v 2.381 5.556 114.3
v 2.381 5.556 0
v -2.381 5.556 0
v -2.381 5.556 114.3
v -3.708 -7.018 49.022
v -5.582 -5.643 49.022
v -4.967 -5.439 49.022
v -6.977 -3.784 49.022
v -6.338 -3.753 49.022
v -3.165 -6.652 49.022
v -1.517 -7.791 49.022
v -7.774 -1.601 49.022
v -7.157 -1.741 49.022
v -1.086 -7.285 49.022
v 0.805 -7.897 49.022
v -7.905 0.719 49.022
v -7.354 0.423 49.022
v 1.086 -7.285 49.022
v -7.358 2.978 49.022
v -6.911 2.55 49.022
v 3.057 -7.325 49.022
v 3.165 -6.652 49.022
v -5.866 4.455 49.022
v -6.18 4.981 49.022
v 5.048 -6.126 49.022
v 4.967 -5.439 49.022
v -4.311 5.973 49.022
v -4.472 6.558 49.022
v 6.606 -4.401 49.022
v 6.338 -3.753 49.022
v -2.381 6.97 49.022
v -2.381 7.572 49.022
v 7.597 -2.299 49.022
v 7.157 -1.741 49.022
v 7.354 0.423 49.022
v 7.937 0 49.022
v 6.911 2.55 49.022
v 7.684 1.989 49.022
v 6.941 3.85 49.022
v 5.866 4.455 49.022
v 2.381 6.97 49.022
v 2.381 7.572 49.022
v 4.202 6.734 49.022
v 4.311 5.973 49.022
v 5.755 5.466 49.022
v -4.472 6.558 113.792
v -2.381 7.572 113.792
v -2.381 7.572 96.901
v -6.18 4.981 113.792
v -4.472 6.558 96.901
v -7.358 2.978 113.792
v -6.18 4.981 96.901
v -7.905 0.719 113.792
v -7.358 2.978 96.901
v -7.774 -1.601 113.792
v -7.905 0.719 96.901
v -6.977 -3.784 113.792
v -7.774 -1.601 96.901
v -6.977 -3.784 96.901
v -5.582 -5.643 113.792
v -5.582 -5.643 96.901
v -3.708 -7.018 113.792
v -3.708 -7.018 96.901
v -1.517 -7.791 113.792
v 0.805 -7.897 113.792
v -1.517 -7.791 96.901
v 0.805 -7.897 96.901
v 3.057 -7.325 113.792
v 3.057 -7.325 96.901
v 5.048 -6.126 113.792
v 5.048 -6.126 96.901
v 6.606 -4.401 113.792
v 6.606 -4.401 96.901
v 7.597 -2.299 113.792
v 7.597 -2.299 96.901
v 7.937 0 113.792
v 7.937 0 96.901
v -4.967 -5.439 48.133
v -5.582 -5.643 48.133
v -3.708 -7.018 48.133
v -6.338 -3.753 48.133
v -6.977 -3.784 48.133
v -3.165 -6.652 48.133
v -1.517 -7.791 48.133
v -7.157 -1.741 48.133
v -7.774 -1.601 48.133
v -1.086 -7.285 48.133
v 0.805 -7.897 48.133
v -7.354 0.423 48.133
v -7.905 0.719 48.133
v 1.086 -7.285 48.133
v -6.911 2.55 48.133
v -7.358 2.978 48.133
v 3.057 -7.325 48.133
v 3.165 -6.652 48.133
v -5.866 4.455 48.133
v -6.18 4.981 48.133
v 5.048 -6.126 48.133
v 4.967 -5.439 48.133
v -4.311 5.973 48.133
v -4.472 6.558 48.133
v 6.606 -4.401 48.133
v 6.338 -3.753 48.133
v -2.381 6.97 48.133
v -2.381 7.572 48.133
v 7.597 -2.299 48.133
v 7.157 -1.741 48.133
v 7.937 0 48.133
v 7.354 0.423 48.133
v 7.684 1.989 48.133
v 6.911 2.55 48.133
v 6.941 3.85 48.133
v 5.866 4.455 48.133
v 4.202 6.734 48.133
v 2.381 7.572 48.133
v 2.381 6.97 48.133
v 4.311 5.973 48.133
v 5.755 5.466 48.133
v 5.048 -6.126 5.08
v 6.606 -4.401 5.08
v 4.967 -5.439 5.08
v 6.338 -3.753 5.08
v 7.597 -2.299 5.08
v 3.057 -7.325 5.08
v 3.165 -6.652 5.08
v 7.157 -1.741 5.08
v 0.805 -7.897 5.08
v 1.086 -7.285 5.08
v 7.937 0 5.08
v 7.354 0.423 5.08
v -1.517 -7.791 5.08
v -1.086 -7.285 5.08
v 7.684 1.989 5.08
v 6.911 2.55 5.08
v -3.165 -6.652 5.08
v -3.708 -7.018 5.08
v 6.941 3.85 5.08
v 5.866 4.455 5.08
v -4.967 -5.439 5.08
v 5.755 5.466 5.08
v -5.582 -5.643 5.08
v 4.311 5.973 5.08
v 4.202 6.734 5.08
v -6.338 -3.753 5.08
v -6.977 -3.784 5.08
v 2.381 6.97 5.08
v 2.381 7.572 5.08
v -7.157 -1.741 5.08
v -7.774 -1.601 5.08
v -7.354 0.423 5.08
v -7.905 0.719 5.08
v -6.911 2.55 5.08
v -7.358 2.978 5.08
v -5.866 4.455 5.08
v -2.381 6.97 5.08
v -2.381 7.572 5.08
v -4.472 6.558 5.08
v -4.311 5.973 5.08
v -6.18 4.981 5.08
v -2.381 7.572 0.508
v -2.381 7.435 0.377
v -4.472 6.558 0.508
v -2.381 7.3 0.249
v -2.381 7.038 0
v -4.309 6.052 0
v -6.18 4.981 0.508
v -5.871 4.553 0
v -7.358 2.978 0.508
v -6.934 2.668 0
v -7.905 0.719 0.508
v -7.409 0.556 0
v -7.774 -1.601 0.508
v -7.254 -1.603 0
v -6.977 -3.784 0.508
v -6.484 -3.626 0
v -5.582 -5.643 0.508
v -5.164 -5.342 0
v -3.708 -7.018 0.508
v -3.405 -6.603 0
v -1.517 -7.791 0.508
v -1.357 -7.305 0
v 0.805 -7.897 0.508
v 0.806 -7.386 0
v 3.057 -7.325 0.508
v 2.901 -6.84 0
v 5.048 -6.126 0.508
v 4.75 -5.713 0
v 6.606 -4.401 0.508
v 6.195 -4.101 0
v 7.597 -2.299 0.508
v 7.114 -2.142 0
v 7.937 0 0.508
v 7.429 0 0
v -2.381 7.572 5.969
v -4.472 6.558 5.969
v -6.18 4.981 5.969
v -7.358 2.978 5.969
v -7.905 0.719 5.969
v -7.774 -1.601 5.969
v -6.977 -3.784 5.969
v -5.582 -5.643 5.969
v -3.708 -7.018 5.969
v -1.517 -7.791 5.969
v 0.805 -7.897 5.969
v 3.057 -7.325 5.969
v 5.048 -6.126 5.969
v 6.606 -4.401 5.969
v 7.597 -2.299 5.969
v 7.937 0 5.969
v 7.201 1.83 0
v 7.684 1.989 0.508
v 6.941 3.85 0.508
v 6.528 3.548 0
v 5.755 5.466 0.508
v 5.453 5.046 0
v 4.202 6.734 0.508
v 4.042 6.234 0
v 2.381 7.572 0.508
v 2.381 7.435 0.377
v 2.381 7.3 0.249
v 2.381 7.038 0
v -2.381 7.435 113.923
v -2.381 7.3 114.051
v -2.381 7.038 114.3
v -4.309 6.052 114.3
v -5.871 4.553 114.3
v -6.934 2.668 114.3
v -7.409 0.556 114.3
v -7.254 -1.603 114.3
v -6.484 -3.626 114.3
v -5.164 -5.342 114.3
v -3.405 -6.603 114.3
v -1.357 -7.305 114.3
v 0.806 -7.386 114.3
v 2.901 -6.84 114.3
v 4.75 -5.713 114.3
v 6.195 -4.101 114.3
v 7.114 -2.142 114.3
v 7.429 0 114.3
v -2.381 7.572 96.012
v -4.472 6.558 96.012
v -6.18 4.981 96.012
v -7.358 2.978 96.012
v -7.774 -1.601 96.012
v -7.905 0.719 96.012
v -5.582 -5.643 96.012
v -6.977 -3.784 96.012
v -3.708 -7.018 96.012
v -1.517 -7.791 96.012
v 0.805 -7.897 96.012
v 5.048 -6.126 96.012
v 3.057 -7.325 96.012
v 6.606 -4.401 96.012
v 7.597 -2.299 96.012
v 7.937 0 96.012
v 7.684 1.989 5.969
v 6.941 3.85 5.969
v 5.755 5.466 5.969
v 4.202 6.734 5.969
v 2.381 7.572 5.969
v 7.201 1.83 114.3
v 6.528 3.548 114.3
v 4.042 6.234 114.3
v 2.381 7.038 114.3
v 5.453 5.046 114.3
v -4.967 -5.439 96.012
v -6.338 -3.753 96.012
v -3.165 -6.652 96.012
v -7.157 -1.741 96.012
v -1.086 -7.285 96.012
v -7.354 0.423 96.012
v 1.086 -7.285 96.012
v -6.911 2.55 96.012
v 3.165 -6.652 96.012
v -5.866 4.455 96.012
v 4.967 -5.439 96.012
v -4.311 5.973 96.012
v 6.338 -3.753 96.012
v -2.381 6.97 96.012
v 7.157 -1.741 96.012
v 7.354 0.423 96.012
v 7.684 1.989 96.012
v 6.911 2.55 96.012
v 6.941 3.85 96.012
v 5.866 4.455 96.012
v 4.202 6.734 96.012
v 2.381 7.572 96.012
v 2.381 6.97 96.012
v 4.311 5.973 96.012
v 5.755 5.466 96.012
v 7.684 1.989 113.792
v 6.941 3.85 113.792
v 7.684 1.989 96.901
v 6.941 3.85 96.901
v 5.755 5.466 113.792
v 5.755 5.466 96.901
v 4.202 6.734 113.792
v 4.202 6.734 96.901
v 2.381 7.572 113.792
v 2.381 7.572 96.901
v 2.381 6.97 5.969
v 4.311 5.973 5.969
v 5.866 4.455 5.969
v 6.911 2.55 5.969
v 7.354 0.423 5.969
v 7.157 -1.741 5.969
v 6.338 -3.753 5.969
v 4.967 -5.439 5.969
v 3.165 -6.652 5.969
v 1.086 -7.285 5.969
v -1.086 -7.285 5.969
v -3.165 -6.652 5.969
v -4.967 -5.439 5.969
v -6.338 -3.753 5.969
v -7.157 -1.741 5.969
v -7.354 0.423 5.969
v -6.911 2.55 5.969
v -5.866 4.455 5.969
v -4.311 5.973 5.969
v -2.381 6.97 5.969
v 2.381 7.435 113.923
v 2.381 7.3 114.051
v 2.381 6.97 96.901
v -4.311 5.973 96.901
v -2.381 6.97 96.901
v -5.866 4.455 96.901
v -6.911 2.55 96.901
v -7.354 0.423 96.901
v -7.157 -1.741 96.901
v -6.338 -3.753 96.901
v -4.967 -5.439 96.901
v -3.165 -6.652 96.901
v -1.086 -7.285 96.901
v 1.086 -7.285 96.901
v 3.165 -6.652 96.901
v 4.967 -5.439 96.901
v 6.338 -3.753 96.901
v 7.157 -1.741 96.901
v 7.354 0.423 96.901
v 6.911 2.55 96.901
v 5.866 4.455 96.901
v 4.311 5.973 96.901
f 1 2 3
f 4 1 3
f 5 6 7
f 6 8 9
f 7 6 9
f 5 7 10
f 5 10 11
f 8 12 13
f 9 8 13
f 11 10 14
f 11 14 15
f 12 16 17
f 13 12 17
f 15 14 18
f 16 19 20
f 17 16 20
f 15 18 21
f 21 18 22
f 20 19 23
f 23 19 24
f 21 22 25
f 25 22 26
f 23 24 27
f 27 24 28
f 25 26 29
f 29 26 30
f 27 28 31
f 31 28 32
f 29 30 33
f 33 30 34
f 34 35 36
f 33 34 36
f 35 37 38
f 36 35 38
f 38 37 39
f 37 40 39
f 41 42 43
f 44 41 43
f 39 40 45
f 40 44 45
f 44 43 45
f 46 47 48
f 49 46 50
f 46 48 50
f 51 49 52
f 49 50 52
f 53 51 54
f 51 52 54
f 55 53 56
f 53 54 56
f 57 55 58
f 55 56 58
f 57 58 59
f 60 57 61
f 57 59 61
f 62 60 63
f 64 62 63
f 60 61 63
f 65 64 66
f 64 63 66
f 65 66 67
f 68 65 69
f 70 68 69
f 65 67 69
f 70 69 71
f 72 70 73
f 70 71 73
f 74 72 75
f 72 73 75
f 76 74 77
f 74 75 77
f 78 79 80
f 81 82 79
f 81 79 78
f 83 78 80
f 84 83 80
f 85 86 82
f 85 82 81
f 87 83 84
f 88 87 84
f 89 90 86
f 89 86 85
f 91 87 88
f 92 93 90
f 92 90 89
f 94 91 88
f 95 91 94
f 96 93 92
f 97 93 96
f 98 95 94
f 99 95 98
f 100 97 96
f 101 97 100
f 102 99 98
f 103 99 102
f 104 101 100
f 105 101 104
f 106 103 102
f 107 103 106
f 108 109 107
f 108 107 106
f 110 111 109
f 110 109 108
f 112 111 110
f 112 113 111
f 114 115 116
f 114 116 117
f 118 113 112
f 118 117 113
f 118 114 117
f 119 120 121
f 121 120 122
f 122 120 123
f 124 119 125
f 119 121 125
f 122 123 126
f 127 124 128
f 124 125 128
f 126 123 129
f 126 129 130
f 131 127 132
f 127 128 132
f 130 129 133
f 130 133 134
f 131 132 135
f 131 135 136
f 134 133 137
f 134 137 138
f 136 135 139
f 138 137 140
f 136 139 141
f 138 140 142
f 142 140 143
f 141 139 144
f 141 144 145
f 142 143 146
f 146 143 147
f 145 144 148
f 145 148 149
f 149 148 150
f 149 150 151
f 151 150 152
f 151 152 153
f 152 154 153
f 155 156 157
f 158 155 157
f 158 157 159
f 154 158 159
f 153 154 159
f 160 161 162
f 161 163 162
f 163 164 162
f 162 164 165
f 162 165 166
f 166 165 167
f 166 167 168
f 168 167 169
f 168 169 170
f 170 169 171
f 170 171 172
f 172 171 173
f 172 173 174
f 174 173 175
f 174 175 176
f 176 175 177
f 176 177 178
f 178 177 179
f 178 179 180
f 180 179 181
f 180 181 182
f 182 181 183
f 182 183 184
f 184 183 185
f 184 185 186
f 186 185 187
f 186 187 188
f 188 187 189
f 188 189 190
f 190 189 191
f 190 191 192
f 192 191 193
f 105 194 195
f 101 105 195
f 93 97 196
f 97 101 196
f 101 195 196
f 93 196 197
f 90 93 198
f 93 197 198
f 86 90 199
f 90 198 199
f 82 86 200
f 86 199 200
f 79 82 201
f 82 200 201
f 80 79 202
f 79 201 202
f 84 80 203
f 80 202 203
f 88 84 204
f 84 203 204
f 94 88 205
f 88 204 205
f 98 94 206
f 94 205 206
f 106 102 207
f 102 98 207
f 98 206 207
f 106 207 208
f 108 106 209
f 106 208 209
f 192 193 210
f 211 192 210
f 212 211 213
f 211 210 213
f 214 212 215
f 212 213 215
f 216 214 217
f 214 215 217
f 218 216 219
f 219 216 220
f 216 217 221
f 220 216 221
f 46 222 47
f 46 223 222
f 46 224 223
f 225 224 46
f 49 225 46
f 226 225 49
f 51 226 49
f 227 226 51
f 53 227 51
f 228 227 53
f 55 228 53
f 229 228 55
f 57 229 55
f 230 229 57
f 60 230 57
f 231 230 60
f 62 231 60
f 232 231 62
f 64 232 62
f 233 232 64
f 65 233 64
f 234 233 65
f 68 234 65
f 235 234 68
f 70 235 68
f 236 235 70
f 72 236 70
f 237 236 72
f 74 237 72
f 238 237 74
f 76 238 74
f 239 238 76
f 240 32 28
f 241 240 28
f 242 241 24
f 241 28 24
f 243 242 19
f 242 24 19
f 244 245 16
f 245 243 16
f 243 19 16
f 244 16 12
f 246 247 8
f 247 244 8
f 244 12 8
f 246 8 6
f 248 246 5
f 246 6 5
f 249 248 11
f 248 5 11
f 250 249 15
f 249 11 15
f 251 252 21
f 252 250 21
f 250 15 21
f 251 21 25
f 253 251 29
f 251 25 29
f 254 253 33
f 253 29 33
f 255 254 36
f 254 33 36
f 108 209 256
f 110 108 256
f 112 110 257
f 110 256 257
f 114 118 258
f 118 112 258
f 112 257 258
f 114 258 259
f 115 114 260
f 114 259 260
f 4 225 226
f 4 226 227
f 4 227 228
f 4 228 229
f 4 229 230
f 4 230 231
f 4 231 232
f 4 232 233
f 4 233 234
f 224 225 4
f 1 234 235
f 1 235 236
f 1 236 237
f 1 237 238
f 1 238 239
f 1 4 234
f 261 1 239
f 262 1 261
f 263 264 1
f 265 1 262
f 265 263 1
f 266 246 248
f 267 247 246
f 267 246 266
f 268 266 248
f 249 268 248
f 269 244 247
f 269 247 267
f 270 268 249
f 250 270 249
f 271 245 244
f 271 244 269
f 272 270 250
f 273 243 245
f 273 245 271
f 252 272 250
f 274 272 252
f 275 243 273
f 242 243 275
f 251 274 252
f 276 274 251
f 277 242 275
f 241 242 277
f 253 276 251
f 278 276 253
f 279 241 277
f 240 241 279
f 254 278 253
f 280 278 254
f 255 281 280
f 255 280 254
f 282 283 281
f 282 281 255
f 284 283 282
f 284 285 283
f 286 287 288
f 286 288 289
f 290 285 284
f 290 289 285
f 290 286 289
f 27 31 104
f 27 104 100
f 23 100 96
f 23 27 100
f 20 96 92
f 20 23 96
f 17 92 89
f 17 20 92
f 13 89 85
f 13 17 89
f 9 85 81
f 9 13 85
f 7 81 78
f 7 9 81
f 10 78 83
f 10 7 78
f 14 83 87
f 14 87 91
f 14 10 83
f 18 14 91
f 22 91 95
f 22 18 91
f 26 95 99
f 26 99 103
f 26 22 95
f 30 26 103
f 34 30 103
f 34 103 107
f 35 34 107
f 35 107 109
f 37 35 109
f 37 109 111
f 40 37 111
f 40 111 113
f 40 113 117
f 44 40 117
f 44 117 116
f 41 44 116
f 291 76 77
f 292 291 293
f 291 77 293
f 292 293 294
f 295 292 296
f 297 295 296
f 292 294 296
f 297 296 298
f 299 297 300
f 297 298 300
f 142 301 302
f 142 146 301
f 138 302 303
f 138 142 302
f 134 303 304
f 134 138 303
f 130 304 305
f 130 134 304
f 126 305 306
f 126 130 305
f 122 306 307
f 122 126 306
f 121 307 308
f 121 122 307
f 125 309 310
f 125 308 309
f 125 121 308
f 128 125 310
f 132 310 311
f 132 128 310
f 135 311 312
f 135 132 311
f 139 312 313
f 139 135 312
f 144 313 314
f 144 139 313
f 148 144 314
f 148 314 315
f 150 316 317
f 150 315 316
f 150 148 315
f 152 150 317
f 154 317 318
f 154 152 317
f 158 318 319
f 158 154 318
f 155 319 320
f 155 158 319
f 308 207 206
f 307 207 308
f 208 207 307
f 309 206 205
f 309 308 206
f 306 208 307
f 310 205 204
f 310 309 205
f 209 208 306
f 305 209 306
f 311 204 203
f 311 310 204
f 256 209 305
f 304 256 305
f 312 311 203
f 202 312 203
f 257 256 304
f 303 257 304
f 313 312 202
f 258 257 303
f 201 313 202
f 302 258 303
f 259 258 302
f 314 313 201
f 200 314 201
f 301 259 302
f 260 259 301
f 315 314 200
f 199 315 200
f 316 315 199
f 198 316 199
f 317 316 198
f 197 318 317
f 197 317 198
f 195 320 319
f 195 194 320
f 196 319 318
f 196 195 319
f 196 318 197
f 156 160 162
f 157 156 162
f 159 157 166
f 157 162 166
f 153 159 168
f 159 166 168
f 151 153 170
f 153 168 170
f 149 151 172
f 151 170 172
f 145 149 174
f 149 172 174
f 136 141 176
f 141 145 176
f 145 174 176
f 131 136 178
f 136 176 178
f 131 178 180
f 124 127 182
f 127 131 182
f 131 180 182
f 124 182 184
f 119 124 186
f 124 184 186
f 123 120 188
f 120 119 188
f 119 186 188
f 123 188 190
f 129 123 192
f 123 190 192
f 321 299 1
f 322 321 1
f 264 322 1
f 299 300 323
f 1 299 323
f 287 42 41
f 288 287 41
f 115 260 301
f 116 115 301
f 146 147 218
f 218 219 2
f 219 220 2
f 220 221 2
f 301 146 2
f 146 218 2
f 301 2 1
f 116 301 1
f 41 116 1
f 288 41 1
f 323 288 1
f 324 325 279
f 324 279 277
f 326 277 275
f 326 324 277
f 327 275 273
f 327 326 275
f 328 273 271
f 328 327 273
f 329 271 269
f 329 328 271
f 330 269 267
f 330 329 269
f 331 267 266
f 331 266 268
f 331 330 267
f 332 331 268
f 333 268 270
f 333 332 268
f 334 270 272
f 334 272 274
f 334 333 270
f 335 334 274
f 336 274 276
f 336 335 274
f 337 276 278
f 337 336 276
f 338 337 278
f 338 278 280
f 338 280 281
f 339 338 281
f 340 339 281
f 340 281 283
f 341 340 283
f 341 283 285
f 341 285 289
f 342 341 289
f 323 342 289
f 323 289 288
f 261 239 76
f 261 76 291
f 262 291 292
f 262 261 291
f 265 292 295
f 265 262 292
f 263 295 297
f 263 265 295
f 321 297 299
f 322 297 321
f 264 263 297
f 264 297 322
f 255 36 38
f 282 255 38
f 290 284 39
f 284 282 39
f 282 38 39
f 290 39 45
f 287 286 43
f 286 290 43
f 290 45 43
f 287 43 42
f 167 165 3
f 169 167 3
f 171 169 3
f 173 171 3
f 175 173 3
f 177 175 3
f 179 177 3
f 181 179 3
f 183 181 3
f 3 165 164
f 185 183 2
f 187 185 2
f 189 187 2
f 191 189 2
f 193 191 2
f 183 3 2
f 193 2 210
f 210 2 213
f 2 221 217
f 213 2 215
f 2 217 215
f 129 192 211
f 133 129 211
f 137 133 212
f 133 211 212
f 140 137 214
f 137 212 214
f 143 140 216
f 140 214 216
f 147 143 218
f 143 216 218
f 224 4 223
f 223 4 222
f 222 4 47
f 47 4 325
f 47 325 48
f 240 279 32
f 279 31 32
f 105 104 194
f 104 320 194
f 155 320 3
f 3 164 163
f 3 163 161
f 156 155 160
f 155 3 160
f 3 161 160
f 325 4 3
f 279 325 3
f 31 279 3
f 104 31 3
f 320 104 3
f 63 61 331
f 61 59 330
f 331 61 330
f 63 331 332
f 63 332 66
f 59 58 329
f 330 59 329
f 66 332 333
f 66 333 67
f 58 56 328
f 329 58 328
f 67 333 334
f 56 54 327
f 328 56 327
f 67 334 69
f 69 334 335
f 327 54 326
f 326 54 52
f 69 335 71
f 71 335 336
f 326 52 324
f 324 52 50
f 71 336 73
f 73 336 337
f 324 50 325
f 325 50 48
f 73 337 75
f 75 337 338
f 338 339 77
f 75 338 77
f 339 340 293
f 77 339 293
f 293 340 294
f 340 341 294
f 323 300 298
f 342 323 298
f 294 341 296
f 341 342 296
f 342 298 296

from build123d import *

# Parameters (mm, degrees)
BOSS_EXTRUDE1_DEPTH = 114.3
CHAMFER1_SIZE       = 0.508
SKETCH2_R           = 8.697781756
SKETCH2_R_2         = 7.366
CUT_EXTRUDE1_DEPTH  = 0.889
SKETCH3_OUTSIDE_W   = 41.162
SKETCH3_OUTSIDE_H   = 40.796
SKETCH3_OUTSIDE_R   = 7.366
CUT_EXTRUDE2_DEPTH  = 0.889
SKETCH4_OUTSIDE_W   = 41.162
SKETCH4_OUTSIDE_H   = 40.796
SKETCH4_OUTSIDE_R   = 7.366
CUT_EXTRUDE3_DEPTH  = 0.889


with BuildPart() as part:
    # Sketch1 → Boss-Extrude1 (new body)
    with BuildSketch(Plane.XY):
        with BuildLine():
            ThreePointArc((7.9375, 0), (6.399417088, 4.695888328), (2.38125, 7.571892411))
            Line((2.38125, 7.571892411), (2.38125, 5.55625))
            Line((2.38125, 5.55625), (-2.38125, 5.55625))
            Line((-2.38125, 5.55625), (-2.38125, 7.571892411))
            ThreePointArc((-2.38125, 7.571892411), (-4.695888328, -6.399417088), (7.9375, 0))
        make_face()
    extrude(amount=BOSS_EXTRUDE1_DEPTH)

    # Chamfer1
    chamfer1_edges = [part.edges().sort_by_distance(p)[0] for p in [
        (-4.695888328, -6.399417088, 0),
        (-4.695888328, -6.399417088, 114.3),
    ]]
    chamfer(chamfer1_edges, length=CHAMFER1_SIZE)

    # Sketch2 → Cut-Extrude1 (cut)
    with BuildSketch(Plane(origin=(0, 0, 5.08), x_dir=(-1, 0, 0), z_dir=(0, 0, -1))):
        Circle(SKETCH2_R)
        Circle(SKETCH2_R_2, mode=Mode.SUBTRACT)
    extrude(amount=-CUT_EXTRUDE1_DEPTH, mode=Mode.SUBTRACT)

    # Sketch3 outside → Cut-Extrude2 (cut)
    with BuildSketch(Plane.XY.offset(49.022)):
        with Locations((0, -0.183)):
            Rectangle(SKETCH3_OUTSIDE_W, SKETCH3_OUTSIDE_H)
        Circle(SKETCH3_OUTSIDE_R, mode=Mode.SUBTRACT)
    extrude(amount=-CUT_EXTRUDE2_DEPTH, mode=Mode.SUBTRACT)

    # Sketch4 outside → Cut-Extrude3 (cut)
    with BuildSketch(Plane.XY.offset(96.901)):
        with Locations((0, -0.183)):
            Rectangle(SKETCH4_OUTSIDE_W, SKETCH4_OUTSIDE_H)
        Circle(SKETCH4_OUTSIDE_R, mode=Mode.SUBTRACT)
    extrude(amount=-CUT_EXTRUDE3_DEPTH, mode=Mode.SUBTRACT)


solid = part.part
